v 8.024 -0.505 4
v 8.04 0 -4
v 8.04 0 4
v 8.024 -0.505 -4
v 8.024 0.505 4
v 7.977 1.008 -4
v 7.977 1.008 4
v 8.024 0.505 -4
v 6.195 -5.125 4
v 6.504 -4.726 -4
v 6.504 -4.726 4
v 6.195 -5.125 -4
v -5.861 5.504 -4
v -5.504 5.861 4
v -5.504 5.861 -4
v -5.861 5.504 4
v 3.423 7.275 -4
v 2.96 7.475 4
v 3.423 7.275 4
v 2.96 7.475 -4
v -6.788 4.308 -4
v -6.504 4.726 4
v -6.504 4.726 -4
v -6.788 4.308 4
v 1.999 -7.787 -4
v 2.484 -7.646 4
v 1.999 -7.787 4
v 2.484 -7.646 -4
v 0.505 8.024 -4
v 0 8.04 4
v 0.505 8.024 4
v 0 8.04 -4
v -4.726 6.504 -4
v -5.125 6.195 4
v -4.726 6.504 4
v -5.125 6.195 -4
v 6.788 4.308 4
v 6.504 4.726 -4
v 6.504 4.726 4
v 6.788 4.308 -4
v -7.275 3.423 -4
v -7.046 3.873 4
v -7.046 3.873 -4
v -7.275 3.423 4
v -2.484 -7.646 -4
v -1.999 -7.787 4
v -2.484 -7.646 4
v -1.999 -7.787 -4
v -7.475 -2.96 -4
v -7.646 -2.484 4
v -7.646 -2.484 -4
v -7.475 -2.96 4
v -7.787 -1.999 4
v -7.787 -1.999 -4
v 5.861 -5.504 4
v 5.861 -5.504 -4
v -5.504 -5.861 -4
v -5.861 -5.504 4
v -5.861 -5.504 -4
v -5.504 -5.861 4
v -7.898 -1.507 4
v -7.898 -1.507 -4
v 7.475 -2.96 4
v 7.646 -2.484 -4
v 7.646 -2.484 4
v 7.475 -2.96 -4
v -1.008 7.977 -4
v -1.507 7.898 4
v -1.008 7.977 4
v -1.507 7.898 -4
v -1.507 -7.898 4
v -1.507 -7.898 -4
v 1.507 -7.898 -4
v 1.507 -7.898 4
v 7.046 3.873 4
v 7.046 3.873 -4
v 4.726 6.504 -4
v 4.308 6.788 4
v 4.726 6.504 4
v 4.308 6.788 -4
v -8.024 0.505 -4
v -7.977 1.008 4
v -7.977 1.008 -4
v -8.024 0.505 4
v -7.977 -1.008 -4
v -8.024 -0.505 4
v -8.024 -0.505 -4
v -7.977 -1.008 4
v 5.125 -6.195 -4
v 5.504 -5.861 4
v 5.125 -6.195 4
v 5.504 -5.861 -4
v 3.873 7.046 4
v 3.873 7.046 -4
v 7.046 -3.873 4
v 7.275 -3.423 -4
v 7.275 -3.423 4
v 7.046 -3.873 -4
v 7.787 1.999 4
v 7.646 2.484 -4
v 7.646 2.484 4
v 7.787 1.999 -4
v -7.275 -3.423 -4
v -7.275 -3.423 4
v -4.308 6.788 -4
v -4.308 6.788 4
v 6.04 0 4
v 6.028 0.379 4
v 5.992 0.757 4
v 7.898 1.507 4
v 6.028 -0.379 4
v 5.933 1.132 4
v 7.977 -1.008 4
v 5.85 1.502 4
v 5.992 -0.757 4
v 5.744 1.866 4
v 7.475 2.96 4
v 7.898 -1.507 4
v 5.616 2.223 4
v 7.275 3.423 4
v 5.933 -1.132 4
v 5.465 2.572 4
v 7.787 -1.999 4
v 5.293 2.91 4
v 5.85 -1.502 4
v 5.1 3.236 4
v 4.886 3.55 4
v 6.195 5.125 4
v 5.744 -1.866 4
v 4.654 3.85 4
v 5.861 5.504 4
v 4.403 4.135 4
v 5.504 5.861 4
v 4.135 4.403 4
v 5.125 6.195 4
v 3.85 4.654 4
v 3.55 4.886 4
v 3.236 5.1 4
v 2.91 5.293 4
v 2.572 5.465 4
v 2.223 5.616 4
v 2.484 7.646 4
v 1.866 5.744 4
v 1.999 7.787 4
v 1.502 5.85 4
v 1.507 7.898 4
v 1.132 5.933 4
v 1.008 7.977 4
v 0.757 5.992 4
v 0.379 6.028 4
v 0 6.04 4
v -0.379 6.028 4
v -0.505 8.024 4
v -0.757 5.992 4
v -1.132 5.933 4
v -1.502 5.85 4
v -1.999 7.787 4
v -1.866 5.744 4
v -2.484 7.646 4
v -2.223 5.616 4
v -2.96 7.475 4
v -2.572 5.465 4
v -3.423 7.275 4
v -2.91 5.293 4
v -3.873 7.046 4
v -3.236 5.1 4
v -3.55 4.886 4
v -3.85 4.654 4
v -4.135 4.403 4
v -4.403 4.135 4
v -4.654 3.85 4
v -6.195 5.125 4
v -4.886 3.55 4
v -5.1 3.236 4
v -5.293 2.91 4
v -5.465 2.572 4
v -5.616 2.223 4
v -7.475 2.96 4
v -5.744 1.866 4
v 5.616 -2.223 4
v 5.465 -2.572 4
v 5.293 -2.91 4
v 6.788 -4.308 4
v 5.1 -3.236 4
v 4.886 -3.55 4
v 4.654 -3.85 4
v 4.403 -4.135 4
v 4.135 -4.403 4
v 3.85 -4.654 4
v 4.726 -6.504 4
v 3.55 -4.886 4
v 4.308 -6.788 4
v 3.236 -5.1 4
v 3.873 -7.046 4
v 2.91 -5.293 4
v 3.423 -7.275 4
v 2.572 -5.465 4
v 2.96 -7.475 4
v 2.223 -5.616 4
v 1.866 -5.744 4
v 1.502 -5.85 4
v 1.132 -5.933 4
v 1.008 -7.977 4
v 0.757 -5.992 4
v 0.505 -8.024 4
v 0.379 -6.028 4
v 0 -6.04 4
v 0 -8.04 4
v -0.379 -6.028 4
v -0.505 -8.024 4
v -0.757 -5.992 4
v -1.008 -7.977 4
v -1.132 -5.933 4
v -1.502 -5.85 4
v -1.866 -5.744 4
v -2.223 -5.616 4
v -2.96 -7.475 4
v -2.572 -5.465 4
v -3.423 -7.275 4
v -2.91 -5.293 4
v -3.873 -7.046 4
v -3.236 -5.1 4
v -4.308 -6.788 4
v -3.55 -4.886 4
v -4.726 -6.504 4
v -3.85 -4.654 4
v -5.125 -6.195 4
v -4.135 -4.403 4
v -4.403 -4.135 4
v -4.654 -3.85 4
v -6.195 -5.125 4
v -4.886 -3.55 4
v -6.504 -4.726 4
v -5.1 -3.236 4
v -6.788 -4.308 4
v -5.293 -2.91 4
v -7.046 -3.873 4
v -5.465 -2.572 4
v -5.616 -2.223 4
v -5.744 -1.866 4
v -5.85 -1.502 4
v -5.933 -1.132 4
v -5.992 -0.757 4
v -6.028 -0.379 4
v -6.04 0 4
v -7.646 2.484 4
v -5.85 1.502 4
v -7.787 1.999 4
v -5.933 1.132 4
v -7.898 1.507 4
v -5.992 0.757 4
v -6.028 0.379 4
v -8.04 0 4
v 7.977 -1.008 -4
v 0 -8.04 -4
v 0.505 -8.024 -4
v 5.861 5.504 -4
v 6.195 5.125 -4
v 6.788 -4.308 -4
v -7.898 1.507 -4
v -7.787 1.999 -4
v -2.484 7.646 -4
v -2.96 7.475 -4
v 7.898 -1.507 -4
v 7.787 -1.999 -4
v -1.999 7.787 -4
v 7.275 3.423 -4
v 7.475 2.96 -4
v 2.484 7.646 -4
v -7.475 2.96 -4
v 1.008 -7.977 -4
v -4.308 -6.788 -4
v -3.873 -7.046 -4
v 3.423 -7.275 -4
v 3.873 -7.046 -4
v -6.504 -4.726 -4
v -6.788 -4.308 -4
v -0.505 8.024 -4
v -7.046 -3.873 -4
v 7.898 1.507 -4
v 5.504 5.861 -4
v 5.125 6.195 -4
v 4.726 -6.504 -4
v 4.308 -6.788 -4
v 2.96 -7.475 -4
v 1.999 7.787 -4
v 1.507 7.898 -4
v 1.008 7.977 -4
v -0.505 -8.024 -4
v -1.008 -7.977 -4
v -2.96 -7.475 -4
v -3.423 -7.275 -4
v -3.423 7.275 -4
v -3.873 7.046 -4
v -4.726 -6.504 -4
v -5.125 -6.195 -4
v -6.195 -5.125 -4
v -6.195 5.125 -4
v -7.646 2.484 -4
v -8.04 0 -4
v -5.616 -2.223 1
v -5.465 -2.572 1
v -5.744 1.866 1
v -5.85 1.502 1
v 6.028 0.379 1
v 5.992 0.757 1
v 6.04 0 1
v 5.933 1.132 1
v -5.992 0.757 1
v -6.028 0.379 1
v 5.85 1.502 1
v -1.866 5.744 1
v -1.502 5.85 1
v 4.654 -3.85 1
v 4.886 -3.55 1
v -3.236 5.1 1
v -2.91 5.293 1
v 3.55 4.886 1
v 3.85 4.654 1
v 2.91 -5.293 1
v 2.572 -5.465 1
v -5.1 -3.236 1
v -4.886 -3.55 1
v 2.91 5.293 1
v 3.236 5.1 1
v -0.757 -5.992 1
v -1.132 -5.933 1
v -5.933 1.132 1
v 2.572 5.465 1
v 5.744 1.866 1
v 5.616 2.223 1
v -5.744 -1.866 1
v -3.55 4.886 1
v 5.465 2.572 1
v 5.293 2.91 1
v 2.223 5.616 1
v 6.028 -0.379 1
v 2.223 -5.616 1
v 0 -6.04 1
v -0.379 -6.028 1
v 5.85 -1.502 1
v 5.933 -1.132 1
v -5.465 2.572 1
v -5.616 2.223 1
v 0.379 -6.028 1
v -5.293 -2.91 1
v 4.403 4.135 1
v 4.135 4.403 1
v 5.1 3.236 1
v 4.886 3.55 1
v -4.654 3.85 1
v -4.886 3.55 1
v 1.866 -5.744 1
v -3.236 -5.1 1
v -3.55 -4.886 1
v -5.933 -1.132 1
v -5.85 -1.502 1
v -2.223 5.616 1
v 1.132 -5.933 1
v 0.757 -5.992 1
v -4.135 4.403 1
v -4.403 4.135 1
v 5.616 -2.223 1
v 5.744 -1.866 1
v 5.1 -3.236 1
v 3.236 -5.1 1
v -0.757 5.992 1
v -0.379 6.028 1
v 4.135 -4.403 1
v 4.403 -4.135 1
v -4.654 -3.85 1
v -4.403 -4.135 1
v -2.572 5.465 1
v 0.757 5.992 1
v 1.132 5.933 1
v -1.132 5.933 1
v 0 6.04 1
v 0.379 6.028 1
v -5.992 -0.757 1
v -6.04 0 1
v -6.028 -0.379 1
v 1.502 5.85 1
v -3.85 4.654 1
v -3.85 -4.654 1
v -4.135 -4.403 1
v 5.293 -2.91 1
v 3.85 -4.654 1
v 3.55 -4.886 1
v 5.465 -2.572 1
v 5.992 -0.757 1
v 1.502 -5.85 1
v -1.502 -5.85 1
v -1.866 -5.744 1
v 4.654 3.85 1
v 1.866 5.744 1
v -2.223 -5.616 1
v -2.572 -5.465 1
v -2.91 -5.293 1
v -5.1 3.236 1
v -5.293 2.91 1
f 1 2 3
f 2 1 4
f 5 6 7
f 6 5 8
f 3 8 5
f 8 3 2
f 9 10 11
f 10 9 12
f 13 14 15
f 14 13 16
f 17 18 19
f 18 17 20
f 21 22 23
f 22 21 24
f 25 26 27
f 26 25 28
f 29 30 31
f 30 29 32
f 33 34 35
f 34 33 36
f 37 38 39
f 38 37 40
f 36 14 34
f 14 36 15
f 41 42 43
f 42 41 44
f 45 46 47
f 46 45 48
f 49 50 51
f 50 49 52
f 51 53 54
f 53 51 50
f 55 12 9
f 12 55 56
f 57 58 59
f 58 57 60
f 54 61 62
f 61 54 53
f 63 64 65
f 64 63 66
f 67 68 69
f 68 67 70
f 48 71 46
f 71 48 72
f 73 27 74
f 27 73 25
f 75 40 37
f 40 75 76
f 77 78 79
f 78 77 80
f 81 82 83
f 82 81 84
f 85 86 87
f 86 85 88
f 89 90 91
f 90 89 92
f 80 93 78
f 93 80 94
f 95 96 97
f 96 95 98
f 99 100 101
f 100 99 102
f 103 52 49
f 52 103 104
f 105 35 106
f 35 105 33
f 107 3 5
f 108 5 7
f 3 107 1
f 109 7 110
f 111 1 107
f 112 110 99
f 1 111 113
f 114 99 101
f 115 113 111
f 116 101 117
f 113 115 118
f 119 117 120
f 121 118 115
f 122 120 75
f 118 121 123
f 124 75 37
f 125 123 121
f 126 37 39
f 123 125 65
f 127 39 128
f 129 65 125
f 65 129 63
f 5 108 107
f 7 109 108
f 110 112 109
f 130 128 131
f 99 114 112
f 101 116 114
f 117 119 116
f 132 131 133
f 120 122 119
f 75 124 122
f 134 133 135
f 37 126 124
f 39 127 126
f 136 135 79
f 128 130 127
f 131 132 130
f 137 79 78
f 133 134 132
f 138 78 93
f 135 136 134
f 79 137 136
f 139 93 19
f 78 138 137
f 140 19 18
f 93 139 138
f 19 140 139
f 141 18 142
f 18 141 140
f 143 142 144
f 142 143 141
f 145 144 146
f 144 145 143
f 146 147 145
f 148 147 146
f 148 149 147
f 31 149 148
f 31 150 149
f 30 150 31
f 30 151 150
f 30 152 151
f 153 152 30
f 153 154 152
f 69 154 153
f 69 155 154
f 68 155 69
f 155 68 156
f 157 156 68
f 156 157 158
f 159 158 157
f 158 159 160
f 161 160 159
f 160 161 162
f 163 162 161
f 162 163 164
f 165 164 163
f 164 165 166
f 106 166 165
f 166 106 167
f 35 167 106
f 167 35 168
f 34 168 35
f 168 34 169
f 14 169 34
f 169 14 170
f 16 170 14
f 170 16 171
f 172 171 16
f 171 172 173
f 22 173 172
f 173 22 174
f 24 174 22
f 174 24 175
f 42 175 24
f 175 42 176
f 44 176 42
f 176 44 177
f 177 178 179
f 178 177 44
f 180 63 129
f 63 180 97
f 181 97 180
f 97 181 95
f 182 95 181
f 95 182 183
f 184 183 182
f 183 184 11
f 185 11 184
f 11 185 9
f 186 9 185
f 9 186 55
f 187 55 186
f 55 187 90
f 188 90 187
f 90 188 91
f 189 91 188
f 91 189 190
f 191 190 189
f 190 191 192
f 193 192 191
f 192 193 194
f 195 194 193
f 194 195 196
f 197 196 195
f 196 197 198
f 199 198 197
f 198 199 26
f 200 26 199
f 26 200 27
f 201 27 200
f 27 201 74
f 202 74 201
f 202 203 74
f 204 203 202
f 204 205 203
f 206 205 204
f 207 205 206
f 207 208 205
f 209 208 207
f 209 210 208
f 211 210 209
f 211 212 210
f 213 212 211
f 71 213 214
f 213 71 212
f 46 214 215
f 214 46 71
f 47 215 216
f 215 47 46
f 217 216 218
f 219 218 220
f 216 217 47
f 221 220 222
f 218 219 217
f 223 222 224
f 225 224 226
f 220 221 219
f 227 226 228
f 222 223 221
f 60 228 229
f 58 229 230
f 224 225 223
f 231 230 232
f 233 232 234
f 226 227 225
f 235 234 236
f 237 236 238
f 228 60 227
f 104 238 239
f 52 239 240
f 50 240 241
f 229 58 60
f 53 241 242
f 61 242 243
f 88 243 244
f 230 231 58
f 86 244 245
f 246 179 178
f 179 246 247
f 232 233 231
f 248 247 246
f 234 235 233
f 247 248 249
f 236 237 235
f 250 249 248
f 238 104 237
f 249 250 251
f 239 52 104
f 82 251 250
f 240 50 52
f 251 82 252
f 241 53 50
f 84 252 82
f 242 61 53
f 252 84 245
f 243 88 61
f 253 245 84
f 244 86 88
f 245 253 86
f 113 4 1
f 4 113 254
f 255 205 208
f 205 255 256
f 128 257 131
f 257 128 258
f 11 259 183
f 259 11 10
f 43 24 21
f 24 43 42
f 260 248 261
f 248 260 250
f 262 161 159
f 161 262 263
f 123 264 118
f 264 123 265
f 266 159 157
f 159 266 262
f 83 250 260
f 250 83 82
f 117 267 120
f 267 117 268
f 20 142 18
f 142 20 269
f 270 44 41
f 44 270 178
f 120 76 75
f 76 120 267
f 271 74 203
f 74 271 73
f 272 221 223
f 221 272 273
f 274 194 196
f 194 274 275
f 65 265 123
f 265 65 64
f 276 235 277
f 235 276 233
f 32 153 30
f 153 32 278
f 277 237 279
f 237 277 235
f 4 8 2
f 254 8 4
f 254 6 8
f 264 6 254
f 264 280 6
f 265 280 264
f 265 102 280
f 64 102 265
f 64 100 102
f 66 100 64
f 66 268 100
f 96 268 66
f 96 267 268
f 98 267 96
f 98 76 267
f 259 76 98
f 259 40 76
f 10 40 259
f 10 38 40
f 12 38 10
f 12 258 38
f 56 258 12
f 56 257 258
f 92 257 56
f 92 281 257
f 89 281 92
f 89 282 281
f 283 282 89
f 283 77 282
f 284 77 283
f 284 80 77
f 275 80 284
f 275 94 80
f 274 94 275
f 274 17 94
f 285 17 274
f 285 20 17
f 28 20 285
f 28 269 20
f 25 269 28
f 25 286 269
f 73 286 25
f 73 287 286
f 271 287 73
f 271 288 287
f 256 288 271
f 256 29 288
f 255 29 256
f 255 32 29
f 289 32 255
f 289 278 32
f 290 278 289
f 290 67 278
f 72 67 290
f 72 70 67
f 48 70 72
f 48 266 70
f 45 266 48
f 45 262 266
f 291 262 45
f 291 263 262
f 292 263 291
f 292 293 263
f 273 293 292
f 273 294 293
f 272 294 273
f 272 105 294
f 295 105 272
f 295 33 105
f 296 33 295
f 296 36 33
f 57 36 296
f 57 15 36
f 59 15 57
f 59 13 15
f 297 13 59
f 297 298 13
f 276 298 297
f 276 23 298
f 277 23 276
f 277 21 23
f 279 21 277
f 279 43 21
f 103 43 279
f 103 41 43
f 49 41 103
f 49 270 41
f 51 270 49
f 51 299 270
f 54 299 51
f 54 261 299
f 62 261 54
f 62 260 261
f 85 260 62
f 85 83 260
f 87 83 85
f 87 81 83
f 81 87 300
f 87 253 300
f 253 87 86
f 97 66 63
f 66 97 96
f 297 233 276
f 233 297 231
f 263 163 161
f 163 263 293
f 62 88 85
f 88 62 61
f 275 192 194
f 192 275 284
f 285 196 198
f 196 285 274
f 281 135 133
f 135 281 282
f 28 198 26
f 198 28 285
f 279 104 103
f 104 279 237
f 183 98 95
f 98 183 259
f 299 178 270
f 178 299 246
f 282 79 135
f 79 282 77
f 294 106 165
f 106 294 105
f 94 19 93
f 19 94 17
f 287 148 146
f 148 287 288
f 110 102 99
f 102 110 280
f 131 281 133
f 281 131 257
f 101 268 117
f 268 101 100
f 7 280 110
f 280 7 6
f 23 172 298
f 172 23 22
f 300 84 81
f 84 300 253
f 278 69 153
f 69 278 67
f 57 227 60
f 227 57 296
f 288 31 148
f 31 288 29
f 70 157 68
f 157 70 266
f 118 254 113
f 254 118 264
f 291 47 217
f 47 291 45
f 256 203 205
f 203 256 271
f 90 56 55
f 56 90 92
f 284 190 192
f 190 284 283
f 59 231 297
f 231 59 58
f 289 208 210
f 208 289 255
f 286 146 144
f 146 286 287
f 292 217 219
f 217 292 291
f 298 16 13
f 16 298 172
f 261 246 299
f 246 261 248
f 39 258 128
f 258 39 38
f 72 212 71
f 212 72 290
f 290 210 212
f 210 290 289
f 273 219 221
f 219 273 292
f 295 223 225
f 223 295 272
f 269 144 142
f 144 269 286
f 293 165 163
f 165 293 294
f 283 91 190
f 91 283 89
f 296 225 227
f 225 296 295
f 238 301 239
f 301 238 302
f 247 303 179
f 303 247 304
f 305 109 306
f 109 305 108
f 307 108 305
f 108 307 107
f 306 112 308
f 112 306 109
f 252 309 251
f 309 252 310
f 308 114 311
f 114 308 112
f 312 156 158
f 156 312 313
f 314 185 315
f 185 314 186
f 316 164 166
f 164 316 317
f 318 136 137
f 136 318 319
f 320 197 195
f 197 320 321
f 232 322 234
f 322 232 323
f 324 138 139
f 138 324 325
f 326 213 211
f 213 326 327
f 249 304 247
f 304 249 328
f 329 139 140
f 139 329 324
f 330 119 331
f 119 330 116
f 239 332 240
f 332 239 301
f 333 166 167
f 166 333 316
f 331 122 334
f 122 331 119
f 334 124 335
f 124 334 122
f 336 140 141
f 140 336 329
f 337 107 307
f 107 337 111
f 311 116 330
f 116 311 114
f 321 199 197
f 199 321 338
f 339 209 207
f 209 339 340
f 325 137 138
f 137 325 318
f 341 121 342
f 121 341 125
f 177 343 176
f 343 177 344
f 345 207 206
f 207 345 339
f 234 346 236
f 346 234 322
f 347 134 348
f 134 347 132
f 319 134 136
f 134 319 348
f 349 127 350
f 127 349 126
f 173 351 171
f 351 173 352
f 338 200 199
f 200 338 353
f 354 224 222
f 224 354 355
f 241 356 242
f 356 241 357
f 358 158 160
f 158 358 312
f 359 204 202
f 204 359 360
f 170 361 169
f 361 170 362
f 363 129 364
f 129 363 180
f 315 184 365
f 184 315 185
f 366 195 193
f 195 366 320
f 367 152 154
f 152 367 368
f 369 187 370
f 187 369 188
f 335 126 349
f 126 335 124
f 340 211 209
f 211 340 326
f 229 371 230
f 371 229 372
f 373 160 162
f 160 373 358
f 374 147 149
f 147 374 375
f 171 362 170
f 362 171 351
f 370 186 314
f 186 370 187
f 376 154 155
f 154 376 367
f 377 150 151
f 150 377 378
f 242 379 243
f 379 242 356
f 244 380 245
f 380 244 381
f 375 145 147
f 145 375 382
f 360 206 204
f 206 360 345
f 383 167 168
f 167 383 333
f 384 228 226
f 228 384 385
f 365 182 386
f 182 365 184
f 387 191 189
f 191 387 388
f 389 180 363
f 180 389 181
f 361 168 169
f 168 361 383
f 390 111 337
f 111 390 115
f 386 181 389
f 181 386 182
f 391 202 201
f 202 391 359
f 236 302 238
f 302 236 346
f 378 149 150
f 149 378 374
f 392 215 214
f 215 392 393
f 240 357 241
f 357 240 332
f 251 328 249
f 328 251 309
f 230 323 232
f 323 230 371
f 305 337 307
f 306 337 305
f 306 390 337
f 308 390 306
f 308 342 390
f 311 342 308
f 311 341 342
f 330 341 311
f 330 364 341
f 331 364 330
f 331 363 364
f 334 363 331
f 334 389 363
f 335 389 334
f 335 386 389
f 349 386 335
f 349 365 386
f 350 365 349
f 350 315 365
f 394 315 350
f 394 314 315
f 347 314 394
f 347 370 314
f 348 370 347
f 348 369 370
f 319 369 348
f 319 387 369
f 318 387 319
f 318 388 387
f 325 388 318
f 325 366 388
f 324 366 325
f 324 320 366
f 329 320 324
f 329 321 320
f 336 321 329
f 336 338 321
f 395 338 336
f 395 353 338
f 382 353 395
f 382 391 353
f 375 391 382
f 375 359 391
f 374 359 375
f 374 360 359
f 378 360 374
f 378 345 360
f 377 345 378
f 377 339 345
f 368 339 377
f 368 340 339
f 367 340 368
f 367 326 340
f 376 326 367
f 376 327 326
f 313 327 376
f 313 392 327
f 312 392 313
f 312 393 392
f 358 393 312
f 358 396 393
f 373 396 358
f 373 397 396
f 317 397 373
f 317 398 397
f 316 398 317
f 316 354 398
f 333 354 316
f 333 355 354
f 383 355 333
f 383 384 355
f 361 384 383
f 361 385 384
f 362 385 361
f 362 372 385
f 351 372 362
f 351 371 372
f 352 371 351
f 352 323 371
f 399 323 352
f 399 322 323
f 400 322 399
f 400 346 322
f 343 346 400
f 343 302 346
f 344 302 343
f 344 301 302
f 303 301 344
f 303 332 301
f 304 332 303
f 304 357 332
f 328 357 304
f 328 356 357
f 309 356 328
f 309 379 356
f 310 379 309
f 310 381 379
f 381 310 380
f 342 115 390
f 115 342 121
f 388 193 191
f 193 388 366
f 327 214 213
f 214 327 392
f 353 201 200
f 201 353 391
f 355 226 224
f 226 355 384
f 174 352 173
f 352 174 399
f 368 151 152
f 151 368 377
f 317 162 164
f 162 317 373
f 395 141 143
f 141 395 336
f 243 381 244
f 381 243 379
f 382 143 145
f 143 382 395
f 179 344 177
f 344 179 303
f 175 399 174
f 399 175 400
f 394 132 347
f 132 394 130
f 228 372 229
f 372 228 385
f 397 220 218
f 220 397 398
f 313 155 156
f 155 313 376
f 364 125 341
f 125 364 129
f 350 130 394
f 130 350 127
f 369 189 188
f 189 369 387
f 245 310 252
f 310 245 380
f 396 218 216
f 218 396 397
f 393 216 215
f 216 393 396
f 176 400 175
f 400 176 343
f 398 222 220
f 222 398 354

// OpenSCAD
stemDiameter = 5.54;
stemHeight = 3.6;
wallThickness = 2;
clearance = 0.5;

$fn=100;

difference(){
    cylinder(r=stemDiameter+clearance+wallThickness, h=8, center=true);
    translate([0,0,5]){
        cylinder(r=stemDiameter+clearance, h=8, center=true);
    }
}
